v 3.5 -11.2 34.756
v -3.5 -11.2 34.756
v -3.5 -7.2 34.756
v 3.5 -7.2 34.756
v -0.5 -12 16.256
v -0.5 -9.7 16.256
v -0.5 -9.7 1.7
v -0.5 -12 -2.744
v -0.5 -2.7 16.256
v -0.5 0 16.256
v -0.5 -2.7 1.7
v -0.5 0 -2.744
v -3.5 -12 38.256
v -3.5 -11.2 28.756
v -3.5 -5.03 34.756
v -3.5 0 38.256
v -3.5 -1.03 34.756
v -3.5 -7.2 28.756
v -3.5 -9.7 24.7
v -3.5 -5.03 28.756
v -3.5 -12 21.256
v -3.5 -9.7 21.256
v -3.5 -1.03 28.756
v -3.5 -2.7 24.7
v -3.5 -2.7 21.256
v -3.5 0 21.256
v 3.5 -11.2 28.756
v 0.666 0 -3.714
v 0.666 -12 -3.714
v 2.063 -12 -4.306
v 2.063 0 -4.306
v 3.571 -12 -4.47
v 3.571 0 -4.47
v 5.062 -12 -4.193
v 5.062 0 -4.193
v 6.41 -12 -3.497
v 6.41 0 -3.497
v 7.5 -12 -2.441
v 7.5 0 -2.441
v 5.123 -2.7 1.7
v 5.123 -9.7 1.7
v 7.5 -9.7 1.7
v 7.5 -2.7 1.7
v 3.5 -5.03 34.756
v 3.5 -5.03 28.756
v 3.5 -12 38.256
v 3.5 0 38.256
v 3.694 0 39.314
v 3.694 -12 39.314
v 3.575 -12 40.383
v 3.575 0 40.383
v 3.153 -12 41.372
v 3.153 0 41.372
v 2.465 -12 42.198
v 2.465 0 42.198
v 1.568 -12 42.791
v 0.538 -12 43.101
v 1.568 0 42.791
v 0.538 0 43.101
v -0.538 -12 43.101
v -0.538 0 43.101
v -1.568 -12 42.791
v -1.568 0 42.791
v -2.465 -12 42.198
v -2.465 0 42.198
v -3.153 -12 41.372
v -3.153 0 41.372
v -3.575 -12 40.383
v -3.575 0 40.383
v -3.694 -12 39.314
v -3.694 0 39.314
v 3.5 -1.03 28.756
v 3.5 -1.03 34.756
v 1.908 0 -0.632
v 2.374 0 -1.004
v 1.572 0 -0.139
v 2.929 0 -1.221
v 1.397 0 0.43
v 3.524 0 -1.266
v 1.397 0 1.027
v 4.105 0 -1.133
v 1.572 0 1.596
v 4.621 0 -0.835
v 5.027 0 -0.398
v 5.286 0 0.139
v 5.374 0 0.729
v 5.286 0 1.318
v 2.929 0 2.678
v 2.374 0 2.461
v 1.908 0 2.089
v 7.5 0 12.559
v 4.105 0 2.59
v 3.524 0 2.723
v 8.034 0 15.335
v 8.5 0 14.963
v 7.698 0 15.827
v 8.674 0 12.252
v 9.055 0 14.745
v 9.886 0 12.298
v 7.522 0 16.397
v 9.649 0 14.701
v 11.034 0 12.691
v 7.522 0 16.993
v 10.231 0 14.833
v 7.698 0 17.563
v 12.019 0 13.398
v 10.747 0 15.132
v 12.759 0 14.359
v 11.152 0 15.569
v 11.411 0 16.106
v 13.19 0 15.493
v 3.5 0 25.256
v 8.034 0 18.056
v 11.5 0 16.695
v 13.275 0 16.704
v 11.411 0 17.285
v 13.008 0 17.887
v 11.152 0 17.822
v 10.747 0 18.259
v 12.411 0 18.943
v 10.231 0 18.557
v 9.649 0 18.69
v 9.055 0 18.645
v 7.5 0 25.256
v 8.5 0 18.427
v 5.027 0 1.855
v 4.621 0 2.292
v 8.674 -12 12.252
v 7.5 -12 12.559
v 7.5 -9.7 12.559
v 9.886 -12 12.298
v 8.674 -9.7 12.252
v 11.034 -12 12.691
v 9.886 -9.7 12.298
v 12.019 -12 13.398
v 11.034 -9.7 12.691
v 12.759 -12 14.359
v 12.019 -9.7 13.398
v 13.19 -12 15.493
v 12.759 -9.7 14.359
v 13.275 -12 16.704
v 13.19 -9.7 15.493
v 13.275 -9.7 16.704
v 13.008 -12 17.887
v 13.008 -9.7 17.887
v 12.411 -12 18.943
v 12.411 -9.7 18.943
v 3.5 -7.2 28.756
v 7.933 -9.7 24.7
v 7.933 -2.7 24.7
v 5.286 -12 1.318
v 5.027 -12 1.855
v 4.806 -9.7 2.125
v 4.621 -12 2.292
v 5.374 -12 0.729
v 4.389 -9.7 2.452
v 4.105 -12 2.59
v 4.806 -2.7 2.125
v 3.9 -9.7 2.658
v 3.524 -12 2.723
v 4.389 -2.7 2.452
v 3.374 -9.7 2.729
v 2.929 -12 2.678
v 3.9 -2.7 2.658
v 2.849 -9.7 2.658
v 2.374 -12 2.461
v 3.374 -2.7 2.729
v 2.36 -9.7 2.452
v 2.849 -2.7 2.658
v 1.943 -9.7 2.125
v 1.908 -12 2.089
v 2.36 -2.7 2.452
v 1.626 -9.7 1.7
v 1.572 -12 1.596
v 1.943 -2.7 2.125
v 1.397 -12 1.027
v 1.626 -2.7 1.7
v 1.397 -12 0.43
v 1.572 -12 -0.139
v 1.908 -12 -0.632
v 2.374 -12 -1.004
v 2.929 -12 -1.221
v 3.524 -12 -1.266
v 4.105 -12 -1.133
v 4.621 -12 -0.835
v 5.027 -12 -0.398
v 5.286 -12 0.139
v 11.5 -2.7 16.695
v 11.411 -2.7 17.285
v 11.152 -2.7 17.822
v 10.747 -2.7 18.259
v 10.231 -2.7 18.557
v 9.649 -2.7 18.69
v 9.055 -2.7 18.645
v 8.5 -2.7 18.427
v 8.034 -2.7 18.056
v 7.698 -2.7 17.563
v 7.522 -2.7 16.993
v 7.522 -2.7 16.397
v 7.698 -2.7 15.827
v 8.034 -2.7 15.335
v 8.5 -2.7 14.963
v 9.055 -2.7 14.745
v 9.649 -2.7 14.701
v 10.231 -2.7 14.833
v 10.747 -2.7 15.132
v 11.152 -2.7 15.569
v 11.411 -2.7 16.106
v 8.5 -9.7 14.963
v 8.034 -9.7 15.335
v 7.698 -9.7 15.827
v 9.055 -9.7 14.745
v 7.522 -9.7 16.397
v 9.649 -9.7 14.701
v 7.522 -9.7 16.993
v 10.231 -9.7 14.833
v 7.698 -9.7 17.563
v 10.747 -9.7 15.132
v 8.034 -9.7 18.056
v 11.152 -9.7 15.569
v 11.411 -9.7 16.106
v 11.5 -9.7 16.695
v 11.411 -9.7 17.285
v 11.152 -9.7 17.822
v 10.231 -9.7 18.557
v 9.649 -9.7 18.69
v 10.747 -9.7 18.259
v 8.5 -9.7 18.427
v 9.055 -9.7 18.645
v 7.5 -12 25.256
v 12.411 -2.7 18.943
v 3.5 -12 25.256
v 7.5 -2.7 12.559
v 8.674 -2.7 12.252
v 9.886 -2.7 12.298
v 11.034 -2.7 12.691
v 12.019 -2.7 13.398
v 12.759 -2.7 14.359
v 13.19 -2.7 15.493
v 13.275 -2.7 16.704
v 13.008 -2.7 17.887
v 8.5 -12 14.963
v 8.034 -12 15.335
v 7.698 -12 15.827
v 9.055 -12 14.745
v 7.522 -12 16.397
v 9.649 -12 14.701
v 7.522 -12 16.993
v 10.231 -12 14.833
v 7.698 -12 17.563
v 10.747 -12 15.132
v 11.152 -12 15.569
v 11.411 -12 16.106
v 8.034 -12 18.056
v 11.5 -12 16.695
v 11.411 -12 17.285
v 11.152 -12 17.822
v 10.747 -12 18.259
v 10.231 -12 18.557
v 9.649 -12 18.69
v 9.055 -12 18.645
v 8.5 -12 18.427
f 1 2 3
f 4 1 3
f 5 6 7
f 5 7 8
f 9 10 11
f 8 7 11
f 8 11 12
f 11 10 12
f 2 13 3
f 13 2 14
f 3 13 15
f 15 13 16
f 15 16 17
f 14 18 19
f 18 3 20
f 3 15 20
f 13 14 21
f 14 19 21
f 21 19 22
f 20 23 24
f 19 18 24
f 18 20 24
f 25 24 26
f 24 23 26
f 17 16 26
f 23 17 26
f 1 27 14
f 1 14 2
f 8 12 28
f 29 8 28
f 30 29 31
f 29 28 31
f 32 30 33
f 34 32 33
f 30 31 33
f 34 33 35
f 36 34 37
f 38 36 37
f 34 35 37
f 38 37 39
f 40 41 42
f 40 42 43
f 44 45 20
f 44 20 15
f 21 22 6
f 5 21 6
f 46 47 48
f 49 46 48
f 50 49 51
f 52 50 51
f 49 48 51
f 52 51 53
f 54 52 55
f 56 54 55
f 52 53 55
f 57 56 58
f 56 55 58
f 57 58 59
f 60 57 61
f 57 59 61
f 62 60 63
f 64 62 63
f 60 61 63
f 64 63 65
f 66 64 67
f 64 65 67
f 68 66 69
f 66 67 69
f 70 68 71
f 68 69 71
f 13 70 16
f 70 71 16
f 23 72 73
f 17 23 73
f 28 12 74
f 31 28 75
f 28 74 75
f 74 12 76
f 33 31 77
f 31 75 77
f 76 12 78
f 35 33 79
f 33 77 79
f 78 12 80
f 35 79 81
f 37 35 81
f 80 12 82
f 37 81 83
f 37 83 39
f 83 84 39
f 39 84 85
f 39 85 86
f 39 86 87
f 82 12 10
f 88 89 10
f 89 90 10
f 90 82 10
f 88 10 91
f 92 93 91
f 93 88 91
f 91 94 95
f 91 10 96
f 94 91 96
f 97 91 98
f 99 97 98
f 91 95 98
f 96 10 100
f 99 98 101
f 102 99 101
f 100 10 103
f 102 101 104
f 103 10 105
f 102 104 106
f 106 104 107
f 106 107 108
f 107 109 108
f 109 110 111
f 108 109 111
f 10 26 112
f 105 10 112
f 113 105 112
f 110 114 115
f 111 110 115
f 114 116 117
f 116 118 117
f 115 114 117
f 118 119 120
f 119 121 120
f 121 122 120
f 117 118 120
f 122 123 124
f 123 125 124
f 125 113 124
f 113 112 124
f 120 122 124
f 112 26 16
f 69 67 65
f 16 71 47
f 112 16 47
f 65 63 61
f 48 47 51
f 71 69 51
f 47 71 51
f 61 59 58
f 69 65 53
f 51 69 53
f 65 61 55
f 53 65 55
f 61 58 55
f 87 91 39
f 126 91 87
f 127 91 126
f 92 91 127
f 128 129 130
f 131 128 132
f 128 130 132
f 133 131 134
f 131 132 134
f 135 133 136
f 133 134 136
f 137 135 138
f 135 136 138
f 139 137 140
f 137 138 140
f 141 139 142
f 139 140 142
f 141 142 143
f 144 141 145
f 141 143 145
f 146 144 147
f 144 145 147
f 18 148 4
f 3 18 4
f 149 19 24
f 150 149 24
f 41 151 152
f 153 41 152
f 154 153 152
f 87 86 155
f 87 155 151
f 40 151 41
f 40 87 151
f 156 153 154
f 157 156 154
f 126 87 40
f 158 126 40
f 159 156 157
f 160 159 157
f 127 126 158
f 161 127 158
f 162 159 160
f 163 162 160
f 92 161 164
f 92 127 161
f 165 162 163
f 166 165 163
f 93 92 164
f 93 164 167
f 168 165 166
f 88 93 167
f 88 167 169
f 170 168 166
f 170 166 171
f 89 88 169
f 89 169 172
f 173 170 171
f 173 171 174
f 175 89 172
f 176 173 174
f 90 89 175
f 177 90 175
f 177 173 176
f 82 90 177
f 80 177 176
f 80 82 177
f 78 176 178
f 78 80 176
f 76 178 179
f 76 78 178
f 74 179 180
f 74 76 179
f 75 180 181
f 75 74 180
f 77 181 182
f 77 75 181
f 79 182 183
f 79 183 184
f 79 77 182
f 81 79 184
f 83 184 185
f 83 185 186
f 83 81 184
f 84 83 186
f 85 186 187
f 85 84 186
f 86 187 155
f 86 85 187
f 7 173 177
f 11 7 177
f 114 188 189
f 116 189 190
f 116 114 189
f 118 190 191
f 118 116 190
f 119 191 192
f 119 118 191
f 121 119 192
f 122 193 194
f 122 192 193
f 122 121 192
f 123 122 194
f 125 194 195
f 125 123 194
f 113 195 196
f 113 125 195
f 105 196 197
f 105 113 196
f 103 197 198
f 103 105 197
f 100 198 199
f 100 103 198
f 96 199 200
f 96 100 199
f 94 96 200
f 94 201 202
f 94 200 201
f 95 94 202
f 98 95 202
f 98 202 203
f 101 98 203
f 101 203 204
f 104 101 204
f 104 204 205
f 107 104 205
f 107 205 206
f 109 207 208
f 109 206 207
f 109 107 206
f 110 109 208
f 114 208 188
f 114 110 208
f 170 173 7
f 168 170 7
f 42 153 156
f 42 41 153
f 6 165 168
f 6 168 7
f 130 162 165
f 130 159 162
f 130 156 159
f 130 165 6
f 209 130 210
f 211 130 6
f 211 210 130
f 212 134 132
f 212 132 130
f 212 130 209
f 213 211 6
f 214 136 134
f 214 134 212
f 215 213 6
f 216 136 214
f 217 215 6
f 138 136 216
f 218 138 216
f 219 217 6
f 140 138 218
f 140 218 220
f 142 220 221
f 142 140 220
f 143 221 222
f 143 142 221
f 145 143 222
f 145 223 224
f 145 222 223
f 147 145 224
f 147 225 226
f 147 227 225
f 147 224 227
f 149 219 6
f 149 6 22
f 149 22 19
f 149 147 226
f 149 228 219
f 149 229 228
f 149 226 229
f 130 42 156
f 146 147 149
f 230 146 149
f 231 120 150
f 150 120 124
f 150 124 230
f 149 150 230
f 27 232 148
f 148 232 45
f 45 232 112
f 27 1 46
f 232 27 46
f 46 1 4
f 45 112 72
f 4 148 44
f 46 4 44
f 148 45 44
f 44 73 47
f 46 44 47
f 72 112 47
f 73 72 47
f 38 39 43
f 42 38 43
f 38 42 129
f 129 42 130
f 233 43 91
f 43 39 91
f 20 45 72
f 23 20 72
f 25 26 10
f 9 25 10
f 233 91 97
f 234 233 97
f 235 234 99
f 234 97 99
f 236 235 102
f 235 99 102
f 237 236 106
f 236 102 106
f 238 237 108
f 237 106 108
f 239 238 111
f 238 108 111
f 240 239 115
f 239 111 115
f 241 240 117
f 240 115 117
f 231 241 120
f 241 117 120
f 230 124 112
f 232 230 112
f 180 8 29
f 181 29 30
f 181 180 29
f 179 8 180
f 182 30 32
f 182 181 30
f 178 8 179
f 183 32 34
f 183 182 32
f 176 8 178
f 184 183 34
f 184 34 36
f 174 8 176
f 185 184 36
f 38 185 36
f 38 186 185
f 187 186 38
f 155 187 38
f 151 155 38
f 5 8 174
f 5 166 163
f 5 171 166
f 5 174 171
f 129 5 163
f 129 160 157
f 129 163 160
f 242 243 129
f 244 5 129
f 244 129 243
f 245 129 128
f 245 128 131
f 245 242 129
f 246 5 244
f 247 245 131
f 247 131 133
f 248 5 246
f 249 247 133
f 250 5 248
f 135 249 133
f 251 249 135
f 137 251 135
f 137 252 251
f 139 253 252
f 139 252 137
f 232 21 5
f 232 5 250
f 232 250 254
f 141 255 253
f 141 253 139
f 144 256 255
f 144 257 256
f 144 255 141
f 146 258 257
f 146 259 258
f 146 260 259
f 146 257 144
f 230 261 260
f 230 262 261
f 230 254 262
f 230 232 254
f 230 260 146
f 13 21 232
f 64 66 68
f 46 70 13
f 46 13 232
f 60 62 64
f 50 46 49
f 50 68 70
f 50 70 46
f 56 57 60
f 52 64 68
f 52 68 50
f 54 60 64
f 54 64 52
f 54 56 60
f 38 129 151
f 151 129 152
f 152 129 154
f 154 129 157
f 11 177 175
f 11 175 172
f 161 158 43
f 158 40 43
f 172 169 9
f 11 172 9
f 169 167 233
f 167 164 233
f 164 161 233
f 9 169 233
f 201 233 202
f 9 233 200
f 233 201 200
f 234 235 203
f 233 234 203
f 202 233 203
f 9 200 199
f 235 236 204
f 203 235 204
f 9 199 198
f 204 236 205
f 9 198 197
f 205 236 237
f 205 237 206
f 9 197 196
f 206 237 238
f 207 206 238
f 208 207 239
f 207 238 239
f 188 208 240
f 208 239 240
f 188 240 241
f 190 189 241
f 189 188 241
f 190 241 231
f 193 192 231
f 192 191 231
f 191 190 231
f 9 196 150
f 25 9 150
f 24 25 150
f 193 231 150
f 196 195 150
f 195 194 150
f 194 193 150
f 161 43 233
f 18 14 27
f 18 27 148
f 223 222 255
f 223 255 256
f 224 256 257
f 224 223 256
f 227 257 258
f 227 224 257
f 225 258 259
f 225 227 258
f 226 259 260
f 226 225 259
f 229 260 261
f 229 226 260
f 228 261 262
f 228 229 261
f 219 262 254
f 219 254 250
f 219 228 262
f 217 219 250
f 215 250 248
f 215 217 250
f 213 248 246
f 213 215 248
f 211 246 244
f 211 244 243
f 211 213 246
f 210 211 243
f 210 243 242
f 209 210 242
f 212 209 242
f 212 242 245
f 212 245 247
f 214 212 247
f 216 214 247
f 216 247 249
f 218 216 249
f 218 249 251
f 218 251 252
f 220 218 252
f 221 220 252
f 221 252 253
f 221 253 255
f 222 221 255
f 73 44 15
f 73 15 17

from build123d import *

# Parameters (mm, degrees)
F0_R          = 2
F1_DEPTH      = 12
F2_W          = 4
F2_H          = 6
F3_DEPTH      = 7.197026
F4_W          = 7
F4_H          = 23
F5_DEPTH      = 13.288298
F5_DEPTH_BACK = 25


with BuildPart() as f1:
    # F0 (on Front) → F1 (new body)
    with BuildSketch(Plane.XZ):
        with BuildLine():
            ThreePointArc((3.5, 38.256184), (0, 43.139899), (-3.5, 38.256184))
            Line((-3.5, 38.256184), (-3.5, 21.256184))
            Line((-3.5, 21.256184), (-0.5, 16.256184))
            Line((-0.5, 16.256184), (-0.5, -2.743816))
            ThreePointArc((-0.5, -2.743816), (3.571034, -4.470437), (7.5, -2.44121))
            Line((7.5, -2.44121), (7.5, 12.55879))
            ThreePointArc((7.5, 12.55879), (12.424485, 13.851518), (12.410766, 18.942835))
            Line((12.410766, 18.942835), (7.5, 25.256184))
            Line((7.5, 25.256184), (3.5, 25.256184))
            Line((3.5, 25.256184), (3.5, 38.256184))
        make_face()
        with Locations((3.374378, 0.728549)):
            Circle(F0_R, mode=Mode.SUBTRACT)
        with Locations((9.5, 16.695214)):
            Circle(F0_R, mode=Mode.SUBTRACT)
    extrude(amount=F1_DEPTH)

    # F2 (on face) → F3 (cut, through all)
    with BuildSketch(Plane.YZ.offset(3.5)):
        with Locations((-9.2, 31.756184)):
            Rectangle(F2_W, F2_H)
        with Locations((-3.030456, 31.756184)):
            Rectangle(F2_W, F2_H)
    extrude(amount=-F3_DEPTH, mode=Mode.SUBTRACT)

    # F4 (on Right) → F5 (cut, two sides)
    with BuildSketch(Plane.YZ) as f5_sk:
        with Locations((-6.200001, 13.2)):
            Rectangle(F4_W, F4_H)
    extrude(amount=F5_DEPTH, mode=Mode.SUBTRACT)
    extrude(f5_sk.sketch, amount=-F5_DEPTH_BACK, mode=Mode.SUBTRACT)


solid = f1.part
